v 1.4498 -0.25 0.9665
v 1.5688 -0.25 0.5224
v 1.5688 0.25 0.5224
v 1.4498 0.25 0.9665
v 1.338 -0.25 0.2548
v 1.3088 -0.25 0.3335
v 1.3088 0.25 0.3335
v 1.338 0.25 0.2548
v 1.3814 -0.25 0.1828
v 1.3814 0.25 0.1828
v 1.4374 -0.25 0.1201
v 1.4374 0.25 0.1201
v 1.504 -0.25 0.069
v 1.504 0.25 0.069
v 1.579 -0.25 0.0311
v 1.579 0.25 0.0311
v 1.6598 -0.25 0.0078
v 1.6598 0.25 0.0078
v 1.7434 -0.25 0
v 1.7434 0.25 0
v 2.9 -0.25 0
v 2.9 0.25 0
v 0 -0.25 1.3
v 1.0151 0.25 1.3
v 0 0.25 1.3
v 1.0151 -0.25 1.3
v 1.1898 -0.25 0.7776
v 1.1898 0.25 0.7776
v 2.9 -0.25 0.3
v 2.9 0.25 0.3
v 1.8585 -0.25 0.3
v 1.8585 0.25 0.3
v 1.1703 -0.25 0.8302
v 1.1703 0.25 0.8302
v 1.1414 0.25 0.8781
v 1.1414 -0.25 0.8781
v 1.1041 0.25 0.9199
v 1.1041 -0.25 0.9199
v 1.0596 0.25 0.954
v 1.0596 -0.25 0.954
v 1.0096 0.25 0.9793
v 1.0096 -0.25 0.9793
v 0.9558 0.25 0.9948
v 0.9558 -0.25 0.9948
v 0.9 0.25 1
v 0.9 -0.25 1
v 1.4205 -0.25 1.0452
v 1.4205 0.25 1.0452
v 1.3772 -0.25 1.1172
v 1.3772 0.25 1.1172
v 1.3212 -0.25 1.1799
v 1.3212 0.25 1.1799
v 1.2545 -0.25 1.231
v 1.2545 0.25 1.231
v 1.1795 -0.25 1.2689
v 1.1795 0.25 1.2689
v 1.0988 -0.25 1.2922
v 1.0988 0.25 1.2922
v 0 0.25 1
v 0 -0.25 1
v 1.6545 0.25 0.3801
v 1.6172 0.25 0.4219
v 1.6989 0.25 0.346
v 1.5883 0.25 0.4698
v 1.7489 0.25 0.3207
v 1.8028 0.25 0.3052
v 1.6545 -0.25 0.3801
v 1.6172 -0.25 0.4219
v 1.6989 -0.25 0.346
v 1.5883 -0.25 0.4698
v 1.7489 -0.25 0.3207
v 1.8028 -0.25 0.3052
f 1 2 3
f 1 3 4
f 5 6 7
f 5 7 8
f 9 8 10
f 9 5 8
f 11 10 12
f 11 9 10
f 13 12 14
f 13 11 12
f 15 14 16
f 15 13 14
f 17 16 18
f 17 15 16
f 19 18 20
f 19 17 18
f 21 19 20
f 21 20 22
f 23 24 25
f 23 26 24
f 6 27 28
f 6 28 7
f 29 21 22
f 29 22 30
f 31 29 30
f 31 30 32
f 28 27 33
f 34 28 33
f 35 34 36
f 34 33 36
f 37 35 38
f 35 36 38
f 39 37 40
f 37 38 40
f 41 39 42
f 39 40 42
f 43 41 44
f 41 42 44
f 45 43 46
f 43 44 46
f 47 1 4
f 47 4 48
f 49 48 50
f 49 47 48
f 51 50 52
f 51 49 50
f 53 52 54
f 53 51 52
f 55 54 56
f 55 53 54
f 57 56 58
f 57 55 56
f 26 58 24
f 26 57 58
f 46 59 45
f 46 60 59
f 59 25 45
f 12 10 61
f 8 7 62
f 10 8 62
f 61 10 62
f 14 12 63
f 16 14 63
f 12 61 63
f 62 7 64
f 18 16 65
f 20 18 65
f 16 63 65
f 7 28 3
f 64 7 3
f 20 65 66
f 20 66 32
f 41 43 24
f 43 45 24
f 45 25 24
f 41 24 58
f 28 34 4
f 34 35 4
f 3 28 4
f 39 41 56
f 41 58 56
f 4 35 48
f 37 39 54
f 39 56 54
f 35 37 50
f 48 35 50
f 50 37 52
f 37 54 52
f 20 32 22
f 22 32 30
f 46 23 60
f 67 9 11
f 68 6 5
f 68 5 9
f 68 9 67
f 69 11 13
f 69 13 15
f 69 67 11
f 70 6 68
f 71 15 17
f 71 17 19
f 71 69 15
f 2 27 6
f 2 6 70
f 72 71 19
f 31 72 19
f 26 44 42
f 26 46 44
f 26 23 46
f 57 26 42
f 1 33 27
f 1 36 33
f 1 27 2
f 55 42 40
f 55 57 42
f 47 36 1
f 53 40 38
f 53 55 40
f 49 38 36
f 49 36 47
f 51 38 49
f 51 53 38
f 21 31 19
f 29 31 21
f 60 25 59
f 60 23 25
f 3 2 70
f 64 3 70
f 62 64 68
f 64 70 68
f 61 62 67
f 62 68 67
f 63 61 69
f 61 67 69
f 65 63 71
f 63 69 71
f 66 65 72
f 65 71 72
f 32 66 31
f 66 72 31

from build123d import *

# Parameters (mm, degrees)
PAD_DEPTH = 0.25


with BuildPart() as part:
    # Sketch → Pad (new body, symmetric)
    with BuildSketch(Plane.XZ):
        with BuildLine():
            Line((0, 1), (0.9, 1))
            ThreePointArc((1.189778, 0.777646), (1.082628, 0.938006), (0.9, 1))
            Line((1.189778, 0.777646), (1.308778, 0.333531))
            ThreePointArc((1.308778, 0.333531), (1.469502, 0.092991), (1.743444, 0))
            Line((1.743444, 0), (2.9, 0))
            Line((2.9, 0), (2.9, 0.3))
            Line((2.9, 0.3), (1.858543, 0.3))
            ThreePointArc((1.568766, 0.522354), (1.675915, 0.361994), (1.858543, 0.3))
            Line((1.568766, 0.522354), (1.449766, 0.966469))
            ThreePointArc((1.449766, 0.966469), (1.289042, 1.207009), (1.015099, 1.3))
            Line((1.015099, 1.3), (0, 1.3))
            Line((0, 1.3), (0, 1))
        make_face()
    extrude(amount=PAD_DEPTH, both=True)


solid = part.part
